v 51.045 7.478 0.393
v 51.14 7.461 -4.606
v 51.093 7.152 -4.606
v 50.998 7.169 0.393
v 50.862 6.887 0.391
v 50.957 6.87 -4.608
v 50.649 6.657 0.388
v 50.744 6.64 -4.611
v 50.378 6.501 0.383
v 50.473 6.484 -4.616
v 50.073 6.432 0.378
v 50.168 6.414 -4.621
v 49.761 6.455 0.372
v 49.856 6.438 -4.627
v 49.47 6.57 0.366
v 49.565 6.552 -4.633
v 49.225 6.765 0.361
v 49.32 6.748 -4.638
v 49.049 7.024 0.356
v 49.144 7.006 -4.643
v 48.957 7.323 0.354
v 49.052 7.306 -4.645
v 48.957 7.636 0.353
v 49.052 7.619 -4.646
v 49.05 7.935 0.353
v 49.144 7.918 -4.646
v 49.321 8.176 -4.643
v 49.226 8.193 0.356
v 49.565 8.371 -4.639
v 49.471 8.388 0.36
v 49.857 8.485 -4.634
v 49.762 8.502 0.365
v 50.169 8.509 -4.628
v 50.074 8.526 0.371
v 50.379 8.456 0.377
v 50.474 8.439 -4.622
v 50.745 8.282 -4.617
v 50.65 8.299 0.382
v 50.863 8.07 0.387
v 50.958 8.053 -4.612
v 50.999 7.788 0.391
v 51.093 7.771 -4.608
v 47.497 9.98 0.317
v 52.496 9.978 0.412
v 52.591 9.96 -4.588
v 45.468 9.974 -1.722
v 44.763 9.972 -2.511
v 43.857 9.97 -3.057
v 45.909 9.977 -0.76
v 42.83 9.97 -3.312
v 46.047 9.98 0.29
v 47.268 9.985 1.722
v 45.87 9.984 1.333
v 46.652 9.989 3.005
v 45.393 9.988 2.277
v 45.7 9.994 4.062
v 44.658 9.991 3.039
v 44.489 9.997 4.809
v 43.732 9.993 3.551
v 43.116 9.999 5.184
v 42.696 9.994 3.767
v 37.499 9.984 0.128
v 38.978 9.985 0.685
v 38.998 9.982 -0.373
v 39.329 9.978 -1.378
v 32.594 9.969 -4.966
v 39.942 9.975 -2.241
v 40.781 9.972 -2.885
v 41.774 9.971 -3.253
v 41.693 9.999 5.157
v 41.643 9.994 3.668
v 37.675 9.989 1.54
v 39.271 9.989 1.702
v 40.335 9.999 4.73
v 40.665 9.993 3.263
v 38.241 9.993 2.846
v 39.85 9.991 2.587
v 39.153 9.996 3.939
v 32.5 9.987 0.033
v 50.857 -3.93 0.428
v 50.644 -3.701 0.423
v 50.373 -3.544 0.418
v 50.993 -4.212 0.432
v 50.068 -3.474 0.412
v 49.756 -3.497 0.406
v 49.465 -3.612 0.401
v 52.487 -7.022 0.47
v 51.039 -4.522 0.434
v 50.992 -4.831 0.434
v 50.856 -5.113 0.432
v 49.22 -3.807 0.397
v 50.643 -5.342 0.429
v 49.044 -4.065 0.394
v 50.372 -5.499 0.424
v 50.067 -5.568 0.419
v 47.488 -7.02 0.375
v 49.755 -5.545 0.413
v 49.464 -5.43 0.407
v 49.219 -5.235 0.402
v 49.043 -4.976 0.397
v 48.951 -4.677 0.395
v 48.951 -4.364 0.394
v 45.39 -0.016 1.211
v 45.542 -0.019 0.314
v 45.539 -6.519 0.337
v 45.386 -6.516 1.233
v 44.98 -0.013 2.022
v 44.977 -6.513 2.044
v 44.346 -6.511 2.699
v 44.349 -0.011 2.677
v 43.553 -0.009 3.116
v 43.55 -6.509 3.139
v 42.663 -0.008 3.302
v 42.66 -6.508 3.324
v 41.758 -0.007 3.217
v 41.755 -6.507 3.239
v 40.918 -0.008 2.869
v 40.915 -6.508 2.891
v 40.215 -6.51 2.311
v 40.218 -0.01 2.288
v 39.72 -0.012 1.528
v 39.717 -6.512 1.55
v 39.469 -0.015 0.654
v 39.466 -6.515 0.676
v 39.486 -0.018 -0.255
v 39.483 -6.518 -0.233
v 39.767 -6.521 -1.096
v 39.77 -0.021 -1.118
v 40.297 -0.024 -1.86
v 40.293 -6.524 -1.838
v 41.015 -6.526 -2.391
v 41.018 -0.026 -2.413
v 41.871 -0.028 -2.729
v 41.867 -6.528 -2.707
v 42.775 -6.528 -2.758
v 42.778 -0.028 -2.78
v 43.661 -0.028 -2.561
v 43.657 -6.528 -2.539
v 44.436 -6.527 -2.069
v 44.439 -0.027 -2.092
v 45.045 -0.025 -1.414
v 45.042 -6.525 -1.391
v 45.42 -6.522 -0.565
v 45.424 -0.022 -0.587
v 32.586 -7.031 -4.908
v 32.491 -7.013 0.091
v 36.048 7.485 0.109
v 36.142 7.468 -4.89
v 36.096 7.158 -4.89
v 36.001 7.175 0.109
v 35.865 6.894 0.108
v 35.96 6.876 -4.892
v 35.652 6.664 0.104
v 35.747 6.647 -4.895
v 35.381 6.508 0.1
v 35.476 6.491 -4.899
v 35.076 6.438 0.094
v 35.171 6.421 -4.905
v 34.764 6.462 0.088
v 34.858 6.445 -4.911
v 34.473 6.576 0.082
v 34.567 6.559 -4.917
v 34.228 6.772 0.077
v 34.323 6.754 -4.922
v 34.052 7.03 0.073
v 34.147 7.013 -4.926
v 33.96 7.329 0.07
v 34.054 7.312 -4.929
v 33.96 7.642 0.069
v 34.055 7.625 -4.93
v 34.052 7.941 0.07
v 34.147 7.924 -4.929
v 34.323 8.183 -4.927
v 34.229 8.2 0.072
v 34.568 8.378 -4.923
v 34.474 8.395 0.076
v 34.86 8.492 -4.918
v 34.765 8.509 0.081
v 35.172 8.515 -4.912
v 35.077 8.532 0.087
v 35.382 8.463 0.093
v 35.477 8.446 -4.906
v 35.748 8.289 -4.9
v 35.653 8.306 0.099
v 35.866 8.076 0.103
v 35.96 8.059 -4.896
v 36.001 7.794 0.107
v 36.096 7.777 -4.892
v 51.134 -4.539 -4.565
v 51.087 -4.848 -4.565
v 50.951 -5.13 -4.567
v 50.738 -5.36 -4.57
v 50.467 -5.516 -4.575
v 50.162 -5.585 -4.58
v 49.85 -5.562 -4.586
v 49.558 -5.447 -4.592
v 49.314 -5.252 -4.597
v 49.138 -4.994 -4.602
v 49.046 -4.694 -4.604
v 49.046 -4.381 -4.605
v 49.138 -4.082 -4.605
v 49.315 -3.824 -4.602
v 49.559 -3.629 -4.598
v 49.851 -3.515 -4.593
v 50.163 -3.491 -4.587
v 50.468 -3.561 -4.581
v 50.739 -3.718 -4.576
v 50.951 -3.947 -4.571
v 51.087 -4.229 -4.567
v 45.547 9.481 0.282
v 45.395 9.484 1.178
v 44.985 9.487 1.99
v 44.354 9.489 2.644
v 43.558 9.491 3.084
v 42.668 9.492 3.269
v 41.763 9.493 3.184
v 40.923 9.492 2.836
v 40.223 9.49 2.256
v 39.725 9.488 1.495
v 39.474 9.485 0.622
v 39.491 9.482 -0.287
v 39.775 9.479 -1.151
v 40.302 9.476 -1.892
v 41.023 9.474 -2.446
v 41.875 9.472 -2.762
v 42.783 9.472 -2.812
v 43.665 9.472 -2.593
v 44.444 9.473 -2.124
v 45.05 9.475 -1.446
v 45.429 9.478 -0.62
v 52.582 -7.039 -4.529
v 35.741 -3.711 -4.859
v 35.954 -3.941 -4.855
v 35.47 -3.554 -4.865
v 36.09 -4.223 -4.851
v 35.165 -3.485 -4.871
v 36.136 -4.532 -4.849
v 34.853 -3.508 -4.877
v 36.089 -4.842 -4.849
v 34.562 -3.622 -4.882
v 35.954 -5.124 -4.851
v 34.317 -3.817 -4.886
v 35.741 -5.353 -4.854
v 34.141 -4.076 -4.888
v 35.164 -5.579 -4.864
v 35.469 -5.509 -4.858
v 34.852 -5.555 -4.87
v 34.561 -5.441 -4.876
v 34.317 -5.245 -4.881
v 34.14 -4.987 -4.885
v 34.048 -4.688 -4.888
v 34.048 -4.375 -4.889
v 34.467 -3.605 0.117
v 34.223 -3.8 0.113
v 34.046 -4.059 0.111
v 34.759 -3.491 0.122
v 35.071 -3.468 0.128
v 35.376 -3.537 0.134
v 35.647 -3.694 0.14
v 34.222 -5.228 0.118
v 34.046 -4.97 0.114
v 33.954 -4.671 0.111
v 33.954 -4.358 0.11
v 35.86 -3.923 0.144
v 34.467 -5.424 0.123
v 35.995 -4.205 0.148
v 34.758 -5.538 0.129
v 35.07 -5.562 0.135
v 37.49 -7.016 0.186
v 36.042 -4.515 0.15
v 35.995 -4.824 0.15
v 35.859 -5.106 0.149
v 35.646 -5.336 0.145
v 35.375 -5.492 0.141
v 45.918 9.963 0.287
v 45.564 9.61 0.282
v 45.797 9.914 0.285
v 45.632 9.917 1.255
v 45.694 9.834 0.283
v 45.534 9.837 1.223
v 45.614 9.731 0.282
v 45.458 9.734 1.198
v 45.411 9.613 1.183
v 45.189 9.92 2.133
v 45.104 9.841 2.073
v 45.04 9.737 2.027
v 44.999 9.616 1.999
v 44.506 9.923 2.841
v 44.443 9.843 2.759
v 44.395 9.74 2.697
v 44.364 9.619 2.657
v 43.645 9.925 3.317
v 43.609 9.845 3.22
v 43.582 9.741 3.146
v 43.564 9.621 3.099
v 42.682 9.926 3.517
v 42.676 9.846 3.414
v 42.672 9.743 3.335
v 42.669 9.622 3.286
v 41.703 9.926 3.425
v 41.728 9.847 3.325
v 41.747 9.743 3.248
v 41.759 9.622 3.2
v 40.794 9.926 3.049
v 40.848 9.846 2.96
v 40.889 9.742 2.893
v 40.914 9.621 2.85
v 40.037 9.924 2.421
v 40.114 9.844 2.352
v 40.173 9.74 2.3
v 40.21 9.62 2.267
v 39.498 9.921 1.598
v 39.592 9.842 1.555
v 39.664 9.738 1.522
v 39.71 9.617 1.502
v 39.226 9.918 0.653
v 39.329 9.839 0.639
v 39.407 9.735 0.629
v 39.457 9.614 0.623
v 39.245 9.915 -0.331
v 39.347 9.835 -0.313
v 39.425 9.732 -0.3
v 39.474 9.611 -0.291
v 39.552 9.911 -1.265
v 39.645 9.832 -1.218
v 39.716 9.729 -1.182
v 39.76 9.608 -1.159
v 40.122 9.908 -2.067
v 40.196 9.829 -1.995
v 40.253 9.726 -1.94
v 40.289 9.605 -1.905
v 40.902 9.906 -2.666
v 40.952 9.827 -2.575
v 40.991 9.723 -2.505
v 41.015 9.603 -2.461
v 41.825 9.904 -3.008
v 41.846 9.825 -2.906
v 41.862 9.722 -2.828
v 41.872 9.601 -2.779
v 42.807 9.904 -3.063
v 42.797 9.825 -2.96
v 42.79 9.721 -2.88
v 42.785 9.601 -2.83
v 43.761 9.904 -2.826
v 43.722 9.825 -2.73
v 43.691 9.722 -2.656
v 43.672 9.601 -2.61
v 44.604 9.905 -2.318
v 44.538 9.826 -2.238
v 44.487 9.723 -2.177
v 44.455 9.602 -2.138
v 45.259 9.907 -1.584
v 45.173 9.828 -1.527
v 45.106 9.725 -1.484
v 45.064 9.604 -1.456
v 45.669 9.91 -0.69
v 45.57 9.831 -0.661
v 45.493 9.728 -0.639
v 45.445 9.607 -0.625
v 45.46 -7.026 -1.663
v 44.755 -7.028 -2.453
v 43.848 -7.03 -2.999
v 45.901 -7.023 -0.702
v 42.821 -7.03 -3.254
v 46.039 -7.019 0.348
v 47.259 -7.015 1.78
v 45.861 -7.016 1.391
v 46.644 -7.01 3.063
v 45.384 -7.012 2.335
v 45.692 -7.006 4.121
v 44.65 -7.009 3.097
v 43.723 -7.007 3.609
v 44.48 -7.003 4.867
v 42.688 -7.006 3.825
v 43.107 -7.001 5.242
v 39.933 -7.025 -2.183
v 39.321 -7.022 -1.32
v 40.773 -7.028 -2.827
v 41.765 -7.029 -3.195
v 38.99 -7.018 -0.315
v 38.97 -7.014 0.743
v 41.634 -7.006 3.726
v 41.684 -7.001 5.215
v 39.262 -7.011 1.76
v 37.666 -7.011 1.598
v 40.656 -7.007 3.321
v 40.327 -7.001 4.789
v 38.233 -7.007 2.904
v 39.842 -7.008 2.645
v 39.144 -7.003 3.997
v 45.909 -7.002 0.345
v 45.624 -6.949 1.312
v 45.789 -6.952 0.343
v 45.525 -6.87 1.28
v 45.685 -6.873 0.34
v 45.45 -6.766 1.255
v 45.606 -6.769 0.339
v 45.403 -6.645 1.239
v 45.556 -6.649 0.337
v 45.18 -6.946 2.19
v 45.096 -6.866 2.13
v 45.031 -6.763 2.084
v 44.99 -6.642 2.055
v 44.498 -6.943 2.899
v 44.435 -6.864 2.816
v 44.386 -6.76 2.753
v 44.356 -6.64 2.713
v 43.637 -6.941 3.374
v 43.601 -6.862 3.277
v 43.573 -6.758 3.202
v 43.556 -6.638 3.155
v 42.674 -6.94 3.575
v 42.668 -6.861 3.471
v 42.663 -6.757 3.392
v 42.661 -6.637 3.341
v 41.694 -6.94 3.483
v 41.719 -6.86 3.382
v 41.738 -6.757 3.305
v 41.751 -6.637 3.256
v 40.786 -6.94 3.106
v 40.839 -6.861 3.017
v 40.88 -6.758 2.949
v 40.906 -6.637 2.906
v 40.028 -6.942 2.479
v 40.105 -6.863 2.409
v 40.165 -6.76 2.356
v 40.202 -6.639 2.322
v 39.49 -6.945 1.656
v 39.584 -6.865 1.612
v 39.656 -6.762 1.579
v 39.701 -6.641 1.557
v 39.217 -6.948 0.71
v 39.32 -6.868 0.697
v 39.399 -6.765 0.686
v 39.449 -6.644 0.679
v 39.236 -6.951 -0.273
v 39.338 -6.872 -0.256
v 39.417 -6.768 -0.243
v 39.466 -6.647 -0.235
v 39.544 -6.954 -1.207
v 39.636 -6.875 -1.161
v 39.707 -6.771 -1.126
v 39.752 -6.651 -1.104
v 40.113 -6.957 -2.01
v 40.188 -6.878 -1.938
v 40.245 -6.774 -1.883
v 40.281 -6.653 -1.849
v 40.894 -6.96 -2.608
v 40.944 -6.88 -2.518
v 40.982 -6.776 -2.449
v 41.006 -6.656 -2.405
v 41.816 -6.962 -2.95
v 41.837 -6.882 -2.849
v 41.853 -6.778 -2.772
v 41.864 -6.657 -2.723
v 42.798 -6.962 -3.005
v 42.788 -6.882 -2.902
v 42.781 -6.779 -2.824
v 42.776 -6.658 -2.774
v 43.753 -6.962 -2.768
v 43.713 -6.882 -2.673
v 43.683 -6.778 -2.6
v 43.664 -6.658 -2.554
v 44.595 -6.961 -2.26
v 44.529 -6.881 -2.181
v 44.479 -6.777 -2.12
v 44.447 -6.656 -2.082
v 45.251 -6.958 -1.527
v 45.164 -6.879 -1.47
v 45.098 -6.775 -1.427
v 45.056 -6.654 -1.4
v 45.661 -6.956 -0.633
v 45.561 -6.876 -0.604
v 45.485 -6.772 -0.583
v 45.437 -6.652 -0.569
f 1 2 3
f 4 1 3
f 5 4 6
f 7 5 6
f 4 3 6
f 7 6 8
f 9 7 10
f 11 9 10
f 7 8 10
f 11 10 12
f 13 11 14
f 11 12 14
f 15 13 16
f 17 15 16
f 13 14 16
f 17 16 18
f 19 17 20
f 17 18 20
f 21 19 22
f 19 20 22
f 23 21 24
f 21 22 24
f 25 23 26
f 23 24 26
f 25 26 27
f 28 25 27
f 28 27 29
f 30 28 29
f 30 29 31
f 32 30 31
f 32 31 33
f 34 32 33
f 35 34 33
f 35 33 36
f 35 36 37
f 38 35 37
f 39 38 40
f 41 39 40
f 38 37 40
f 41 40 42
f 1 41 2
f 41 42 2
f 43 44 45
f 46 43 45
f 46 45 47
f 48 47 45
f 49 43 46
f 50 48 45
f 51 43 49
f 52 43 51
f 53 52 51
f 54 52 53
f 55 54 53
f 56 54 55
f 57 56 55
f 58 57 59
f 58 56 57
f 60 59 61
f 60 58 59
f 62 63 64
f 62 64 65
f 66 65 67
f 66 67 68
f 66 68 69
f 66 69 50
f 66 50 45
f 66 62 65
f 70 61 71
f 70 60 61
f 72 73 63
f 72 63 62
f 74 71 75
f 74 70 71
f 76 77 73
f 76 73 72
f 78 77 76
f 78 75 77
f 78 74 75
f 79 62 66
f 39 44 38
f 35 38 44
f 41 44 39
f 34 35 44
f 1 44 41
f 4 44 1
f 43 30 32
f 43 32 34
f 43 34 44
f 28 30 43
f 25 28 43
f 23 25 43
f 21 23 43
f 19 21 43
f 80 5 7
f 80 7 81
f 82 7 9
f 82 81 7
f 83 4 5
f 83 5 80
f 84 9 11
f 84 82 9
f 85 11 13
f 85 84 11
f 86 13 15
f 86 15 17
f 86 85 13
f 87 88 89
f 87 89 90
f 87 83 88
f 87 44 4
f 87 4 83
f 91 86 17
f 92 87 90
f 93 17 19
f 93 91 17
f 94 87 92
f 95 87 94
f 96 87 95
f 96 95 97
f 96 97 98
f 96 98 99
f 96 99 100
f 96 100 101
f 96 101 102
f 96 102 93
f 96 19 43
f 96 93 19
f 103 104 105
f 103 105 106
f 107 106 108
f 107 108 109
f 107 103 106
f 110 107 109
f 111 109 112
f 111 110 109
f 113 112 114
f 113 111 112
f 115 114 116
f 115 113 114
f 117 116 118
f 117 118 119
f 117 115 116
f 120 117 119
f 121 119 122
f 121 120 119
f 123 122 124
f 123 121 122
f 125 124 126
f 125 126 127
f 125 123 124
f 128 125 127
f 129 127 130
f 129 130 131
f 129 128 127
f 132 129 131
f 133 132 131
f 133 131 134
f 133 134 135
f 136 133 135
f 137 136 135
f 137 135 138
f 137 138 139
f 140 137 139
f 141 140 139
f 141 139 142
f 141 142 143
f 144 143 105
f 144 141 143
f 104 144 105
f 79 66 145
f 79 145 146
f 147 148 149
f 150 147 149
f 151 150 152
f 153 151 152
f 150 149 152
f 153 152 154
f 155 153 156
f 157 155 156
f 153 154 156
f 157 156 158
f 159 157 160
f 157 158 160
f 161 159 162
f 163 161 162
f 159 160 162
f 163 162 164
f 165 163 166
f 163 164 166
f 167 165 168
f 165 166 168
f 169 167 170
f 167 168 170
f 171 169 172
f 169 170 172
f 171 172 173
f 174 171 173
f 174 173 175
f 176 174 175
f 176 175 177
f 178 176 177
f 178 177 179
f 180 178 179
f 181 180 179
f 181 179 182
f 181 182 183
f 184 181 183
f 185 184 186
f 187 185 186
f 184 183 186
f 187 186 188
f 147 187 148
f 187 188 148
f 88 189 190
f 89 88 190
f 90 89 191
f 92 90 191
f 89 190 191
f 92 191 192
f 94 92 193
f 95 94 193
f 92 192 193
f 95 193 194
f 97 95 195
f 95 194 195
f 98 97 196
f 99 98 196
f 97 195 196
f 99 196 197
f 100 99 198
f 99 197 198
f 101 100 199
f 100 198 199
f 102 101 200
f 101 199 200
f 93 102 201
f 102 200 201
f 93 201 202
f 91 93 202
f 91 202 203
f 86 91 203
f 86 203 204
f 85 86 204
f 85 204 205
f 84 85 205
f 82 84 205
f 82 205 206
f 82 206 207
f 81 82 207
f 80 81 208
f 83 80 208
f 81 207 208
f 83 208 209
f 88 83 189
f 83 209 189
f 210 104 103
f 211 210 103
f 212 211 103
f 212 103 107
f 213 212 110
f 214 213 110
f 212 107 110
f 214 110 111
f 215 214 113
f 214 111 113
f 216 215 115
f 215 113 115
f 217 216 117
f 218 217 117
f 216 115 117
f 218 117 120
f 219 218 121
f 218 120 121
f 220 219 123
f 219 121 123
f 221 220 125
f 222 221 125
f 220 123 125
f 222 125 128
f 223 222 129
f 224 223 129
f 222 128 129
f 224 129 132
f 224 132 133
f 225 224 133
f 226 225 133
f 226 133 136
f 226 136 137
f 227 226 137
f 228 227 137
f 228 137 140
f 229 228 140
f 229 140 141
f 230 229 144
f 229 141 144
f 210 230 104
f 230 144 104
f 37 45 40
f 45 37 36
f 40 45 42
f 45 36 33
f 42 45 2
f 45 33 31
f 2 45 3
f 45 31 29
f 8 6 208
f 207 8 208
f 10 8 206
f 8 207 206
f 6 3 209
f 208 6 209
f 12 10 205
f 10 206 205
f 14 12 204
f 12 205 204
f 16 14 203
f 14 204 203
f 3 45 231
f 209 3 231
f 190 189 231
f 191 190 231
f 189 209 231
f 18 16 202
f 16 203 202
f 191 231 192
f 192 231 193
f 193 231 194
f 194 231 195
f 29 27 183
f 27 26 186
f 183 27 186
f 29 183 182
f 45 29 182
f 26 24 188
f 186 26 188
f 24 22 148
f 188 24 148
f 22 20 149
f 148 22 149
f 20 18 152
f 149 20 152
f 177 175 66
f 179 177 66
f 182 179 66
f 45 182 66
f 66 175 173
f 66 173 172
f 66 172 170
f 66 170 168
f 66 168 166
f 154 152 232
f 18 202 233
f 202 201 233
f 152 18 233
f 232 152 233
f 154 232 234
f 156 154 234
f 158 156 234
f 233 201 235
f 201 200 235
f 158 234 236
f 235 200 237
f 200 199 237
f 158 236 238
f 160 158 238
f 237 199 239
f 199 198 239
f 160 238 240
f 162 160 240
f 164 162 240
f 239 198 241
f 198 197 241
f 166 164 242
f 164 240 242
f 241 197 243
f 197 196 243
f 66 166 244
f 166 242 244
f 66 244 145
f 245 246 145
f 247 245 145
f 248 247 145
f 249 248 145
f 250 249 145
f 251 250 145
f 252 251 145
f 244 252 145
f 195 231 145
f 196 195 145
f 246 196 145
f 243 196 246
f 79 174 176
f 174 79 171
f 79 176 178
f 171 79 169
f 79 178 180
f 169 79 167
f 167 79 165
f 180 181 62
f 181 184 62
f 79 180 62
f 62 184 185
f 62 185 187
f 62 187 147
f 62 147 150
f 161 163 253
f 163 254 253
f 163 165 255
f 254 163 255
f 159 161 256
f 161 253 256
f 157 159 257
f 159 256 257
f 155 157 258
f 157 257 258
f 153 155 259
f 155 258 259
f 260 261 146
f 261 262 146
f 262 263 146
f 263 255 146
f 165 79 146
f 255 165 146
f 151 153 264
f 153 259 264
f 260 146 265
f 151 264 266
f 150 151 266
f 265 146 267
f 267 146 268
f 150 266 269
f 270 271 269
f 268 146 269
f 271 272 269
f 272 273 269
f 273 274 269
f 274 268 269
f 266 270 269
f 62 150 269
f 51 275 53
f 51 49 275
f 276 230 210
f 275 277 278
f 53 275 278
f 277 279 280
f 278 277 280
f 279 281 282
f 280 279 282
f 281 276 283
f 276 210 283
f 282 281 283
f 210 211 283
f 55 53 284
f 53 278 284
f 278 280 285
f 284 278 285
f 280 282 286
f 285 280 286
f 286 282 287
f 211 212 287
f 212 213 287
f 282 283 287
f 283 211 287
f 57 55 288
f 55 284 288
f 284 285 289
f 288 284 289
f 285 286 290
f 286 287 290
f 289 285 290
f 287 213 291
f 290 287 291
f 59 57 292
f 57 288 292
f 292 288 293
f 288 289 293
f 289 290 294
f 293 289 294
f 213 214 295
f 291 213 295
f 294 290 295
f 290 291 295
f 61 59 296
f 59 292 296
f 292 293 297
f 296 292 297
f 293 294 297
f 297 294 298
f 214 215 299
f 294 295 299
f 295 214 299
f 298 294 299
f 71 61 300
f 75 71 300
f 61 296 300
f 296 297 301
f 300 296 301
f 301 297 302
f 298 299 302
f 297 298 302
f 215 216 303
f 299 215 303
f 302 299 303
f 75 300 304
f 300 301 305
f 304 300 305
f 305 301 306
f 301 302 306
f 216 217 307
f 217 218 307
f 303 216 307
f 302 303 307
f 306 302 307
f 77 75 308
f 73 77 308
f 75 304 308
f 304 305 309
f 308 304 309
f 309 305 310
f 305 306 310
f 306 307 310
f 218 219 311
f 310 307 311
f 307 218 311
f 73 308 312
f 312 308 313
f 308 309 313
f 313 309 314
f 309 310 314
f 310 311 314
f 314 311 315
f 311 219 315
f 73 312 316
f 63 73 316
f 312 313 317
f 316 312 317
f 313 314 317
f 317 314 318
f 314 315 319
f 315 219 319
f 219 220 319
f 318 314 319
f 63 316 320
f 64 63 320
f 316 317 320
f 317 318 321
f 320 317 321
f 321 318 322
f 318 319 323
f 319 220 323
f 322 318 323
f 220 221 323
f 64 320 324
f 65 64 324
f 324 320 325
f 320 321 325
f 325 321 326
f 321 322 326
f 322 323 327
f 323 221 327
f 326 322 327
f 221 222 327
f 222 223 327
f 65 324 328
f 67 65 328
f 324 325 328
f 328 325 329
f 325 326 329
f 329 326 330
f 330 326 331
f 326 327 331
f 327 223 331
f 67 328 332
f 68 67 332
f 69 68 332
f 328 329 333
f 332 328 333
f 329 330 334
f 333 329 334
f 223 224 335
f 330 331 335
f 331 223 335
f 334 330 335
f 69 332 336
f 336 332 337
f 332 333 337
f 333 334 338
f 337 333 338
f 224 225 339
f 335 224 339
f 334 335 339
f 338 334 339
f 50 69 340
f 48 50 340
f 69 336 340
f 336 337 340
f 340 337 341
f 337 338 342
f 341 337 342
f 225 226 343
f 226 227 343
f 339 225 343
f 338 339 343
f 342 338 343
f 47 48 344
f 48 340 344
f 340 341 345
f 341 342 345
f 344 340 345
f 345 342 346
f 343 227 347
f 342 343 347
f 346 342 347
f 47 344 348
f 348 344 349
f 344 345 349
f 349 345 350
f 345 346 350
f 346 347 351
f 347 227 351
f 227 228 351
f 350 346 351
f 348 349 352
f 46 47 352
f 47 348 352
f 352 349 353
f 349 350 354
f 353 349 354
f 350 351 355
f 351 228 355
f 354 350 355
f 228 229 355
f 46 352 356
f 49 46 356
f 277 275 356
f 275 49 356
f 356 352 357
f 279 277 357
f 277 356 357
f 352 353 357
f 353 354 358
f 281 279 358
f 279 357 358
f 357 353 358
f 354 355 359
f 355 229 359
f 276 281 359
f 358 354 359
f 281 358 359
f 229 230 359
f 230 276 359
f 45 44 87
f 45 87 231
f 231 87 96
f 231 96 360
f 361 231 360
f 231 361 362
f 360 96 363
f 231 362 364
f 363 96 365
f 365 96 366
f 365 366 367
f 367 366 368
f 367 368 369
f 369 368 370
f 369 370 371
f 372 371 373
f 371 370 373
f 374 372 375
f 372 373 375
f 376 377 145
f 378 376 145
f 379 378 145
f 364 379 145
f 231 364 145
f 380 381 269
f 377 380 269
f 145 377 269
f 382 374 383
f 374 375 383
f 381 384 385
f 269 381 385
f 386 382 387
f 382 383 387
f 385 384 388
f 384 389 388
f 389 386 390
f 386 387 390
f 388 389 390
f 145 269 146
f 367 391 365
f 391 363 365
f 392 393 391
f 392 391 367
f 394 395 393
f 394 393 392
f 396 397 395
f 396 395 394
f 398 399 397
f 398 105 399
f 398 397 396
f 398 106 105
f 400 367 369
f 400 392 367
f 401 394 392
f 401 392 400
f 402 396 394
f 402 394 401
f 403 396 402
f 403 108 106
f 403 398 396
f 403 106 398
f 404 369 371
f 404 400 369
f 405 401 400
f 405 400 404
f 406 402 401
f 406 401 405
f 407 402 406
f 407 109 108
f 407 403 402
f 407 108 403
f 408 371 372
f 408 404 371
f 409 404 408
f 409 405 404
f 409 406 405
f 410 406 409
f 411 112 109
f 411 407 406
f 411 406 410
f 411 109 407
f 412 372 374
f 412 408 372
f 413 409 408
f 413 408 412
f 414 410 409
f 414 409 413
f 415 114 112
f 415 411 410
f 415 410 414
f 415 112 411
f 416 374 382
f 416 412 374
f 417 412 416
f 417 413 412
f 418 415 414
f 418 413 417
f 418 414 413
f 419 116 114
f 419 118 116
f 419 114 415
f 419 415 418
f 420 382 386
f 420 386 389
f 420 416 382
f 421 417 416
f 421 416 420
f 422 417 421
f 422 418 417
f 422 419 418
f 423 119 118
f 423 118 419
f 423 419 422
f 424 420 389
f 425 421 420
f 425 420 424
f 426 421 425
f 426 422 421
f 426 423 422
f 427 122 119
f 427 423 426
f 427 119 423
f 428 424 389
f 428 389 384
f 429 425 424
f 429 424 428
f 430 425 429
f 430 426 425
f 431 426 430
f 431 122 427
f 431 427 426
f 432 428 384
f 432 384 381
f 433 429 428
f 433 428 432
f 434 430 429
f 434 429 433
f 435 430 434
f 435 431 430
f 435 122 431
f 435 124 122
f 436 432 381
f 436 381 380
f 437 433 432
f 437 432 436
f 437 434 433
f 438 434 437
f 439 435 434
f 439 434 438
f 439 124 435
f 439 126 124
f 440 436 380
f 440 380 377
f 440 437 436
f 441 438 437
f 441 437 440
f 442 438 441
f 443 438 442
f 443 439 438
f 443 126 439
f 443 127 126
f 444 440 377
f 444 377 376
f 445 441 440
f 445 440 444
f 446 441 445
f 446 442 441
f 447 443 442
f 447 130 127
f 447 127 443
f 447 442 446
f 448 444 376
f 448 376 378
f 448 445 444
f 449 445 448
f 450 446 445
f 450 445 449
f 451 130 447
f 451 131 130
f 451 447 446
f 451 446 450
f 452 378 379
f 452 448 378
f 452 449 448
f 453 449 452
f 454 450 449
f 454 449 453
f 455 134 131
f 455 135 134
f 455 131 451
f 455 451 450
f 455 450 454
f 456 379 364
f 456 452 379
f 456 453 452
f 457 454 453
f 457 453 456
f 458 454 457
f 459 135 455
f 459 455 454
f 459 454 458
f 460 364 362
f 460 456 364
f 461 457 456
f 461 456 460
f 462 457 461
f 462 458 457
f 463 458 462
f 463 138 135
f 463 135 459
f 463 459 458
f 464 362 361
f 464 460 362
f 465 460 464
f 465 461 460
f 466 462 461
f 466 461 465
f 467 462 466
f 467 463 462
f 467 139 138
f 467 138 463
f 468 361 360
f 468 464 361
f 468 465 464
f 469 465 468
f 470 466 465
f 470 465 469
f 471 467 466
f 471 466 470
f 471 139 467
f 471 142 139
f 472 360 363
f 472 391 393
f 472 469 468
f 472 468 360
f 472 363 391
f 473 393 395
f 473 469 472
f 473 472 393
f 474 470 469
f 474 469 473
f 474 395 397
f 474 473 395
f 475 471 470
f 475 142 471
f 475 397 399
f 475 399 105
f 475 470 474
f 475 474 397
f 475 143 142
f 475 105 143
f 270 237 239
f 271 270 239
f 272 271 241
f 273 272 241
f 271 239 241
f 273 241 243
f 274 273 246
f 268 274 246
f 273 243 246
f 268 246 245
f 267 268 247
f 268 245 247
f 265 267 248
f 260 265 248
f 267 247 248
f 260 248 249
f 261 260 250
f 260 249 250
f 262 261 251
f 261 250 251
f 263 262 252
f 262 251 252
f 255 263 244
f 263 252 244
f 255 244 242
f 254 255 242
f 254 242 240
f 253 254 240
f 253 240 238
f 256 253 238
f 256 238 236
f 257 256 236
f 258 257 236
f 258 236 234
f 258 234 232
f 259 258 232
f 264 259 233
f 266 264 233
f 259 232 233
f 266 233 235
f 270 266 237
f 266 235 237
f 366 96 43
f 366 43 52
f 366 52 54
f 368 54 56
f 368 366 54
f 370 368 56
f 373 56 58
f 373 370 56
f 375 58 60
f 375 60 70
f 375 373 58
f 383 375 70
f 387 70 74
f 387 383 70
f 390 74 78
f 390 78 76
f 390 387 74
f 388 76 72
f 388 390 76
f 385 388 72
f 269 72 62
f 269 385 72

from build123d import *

# Parameters (mm, degrees)
SKETCH_R              = 3.05
PAD_DEPTH             = 7
PAD_DEPTH_BACK        = 10
SKETCH001_R           = 1.05
POCKET_DEPTH          = 5
FILLET_R              = 0.5
CLONE_ROLL_ANGLE      = -0.195955
CLONE_PITCH_ANGLE     = -1.083793
CLONE_PLACEMENT_ANGLE = -0.025657


with BuildPart() as part:
    # Sketch → Pad (new body, two sides)
    with BuildSketch(Plane.XZ) as pad_sk:
        with BuildLine():
            Line((10, 0), (10, -5))
            Line((10, -5), (-10, -5))
            Line((-10, -5), (-10, 0))
            Line((-10, 0), (-5, 0))
            ThreePointArc((5, 0), (0, 5), (-5, 0))
            Line((10, 0), (5, 0))
        make_face()
        Circle(SKETCH_R, mode=Mode.SUBTRACT)
    extrude(amount=PAD_DEPTH)
    extrude(pad_sk.sketch, amount=-PAD_DEPTH_BACK)

    # Sketch001 → Pocket (cut)
    with BuildSketch(Plane(origin=(0, 0, -5), x_dir=(1, 0, 0), z_dir=(0, 0, -1))):
        with Locations((-7.5, 4.5)):
            Circle(SKETCH001_R)
        with Locations((-7.5, -7.5)):
            Circle(SKETCH001_R)
        with Locations((7.5, -7.5)):
            Circle(SKETCH001_R)
        with Locations((7.5, 4.5)):
            Circle(SKETCH001_R)
    extrude(amount=-POCKET_DEPTH, mode=Mode.SUBTRACT)

    # Fillet
    fillet_edges = [part.edges().sort_by_distance(p)[0] for p in [
        (-3.05, 10, 0),
        (-3.05, -7, 0),
    ]]
    fillet(fillet_edges, radius=FILLET_R)


with BuildPart() as part_1:
    # Clone roll: moved
    add(part.part.rotate(Axis((0, 0, 0), (1, 0, 0)), CLONE_ROLL_ANGLE))


with BuildPart() as part_2:
    # Clone pitch: moved
    add(part_1.part.rotate(Axis((0, 0, 0), (0, 1, 0)), CLONE_PITCH_ANGLE))


with BuildPart() as part_3:
    # Clone placement: moved
    add(part_2.part.moved(Location((42.49284, -0.017909, 0.256585))).rotate(Axis((42.49284, -0.017909, 0.256585), (0, 0, 1)), CLONE_PLACEMENT_ANGLE))


solid = part_3.part
